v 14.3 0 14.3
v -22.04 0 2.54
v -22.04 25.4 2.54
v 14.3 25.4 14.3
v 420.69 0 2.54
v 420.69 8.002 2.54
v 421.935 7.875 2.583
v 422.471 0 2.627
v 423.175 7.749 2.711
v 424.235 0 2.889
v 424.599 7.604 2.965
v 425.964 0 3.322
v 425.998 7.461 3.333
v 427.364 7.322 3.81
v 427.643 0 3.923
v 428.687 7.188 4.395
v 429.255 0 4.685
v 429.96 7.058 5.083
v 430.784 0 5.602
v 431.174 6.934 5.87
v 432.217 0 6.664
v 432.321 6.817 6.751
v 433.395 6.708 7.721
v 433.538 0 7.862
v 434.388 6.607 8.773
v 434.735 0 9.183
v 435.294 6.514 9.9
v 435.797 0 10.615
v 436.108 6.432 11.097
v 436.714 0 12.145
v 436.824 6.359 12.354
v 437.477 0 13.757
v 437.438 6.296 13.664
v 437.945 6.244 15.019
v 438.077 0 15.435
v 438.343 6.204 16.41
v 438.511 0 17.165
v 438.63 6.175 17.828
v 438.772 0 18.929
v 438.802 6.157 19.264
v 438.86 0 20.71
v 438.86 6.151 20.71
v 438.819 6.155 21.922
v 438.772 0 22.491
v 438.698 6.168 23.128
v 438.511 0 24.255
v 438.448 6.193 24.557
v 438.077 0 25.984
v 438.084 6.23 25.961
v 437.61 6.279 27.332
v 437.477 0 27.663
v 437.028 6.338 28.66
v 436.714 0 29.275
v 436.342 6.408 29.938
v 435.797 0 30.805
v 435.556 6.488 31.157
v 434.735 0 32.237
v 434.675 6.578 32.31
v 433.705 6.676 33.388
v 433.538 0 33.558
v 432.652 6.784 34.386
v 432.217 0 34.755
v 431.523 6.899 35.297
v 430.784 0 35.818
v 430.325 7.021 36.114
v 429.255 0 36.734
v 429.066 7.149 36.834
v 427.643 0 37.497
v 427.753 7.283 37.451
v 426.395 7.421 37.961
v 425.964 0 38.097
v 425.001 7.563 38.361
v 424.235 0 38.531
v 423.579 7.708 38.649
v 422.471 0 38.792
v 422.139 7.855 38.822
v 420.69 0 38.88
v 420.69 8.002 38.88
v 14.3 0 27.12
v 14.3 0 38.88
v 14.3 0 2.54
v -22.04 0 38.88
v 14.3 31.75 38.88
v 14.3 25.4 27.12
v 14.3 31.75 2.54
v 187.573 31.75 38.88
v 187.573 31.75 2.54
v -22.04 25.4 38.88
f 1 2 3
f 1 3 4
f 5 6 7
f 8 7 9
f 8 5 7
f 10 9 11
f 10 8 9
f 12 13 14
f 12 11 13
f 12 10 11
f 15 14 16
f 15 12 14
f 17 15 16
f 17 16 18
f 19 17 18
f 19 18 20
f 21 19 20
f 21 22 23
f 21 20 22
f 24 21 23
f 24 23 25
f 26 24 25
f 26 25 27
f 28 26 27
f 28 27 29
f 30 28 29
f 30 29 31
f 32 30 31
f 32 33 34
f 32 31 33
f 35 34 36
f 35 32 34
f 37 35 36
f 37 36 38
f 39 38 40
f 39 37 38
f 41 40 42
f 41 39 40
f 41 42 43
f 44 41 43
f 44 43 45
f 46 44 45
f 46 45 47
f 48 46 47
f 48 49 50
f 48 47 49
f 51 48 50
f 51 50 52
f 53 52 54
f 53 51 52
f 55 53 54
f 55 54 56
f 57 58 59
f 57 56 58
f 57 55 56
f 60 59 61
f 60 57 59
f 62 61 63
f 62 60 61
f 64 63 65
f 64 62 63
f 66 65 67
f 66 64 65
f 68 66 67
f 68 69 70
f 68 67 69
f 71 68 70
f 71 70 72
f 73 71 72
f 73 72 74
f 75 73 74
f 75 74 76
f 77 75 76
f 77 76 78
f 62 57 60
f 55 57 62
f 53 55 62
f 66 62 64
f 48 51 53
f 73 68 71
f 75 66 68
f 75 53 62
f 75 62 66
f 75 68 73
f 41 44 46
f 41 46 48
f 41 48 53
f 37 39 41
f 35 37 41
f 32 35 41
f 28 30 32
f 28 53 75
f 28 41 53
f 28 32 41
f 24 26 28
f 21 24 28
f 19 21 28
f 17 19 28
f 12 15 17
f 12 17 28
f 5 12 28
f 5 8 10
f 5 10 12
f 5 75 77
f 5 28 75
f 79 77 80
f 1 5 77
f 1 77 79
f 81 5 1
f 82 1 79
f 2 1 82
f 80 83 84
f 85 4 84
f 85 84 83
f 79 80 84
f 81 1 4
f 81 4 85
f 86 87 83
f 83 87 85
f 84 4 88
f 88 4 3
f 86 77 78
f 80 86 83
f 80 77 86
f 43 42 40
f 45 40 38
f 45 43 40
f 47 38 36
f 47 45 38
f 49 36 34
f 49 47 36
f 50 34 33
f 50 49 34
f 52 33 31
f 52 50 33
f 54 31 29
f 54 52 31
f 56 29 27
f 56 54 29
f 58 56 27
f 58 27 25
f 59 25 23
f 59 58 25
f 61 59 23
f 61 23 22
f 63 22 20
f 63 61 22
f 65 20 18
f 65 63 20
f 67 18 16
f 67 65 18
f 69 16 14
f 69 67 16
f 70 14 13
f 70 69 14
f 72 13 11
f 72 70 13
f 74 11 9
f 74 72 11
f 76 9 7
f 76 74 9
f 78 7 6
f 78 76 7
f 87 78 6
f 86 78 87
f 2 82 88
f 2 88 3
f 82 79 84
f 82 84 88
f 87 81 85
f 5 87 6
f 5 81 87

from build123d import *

# Parameters (mm, degrees)
BOSS_EXTRUDE1_DEPTH = 31.75
CUT_EXTRUDE2_DEPTH  = 442.504730683
CUT_EXTRUDE4_DEPTH  = 6.35


with BuildPart() as part:
    # Sketch2 → Boss-Extrude1 (new body)
    with BuildSketch(Plane(origin=(0, 0, 0), x_dir=(1, 0, 0), z_dir=(0, 1, 0))):
        with BuildLine():
            Line((14.300231201, -2.54), (420.689751691, -2.54))
            ThreePointArc((420.689751691, -2.54), (438.859641691, -20.70989), (420.689751691, -38.87978))
            Line((420.689751691, -38.87978), (14.300231201, -38.87978))
            Line((14.300231201, -38.87978), (14.300231201, -27.119548799))
            Line((14.300231201, -27.119548799), (-22.039548799, -38.87978))
            Line((-22.039548799, -38.87978), (-22.039548799, -2.54))
            Line((-22.039548799, -2.54), (14.300231201, -14.300231201))
            Line((14.300231201, -14.300231201), (14.300231201, -2.54))
        make_face()
    extrude(amount=BOSS_EXTRUDE1_DEPTH)

    # Sketch4 → Cut-Extrude2 (cut, through all)
    with BuildSketch(Plane.XY.offset(38.87978)):
        Polygon((187.5733876, 31.75), (438.859641691, 31.75), (438.859641691, 6.151225872), align=None)
    extrude(amount=-CUT_EXTRUDE2_DEPTH, mode=Mode.SUBTRACT)

    # Sketch8 → Cut-Extrude4 (cut)
    with BuildSketch(Plane(origin=(0, 31.75, 0), x_dir=(1, 0, 0), z_dir=(0, 1, 0))):
        Polygon((-22.039548799, -2.54), (14.300231201, -14.300231201), (14.300231201, -27.119548799), (-22.039548799, -38.87978), align=None)
    extrude(amount=-CUT_EXTRUDE4_DEPTH, mode=Mode.SUBTRACT)


solid = part.part
